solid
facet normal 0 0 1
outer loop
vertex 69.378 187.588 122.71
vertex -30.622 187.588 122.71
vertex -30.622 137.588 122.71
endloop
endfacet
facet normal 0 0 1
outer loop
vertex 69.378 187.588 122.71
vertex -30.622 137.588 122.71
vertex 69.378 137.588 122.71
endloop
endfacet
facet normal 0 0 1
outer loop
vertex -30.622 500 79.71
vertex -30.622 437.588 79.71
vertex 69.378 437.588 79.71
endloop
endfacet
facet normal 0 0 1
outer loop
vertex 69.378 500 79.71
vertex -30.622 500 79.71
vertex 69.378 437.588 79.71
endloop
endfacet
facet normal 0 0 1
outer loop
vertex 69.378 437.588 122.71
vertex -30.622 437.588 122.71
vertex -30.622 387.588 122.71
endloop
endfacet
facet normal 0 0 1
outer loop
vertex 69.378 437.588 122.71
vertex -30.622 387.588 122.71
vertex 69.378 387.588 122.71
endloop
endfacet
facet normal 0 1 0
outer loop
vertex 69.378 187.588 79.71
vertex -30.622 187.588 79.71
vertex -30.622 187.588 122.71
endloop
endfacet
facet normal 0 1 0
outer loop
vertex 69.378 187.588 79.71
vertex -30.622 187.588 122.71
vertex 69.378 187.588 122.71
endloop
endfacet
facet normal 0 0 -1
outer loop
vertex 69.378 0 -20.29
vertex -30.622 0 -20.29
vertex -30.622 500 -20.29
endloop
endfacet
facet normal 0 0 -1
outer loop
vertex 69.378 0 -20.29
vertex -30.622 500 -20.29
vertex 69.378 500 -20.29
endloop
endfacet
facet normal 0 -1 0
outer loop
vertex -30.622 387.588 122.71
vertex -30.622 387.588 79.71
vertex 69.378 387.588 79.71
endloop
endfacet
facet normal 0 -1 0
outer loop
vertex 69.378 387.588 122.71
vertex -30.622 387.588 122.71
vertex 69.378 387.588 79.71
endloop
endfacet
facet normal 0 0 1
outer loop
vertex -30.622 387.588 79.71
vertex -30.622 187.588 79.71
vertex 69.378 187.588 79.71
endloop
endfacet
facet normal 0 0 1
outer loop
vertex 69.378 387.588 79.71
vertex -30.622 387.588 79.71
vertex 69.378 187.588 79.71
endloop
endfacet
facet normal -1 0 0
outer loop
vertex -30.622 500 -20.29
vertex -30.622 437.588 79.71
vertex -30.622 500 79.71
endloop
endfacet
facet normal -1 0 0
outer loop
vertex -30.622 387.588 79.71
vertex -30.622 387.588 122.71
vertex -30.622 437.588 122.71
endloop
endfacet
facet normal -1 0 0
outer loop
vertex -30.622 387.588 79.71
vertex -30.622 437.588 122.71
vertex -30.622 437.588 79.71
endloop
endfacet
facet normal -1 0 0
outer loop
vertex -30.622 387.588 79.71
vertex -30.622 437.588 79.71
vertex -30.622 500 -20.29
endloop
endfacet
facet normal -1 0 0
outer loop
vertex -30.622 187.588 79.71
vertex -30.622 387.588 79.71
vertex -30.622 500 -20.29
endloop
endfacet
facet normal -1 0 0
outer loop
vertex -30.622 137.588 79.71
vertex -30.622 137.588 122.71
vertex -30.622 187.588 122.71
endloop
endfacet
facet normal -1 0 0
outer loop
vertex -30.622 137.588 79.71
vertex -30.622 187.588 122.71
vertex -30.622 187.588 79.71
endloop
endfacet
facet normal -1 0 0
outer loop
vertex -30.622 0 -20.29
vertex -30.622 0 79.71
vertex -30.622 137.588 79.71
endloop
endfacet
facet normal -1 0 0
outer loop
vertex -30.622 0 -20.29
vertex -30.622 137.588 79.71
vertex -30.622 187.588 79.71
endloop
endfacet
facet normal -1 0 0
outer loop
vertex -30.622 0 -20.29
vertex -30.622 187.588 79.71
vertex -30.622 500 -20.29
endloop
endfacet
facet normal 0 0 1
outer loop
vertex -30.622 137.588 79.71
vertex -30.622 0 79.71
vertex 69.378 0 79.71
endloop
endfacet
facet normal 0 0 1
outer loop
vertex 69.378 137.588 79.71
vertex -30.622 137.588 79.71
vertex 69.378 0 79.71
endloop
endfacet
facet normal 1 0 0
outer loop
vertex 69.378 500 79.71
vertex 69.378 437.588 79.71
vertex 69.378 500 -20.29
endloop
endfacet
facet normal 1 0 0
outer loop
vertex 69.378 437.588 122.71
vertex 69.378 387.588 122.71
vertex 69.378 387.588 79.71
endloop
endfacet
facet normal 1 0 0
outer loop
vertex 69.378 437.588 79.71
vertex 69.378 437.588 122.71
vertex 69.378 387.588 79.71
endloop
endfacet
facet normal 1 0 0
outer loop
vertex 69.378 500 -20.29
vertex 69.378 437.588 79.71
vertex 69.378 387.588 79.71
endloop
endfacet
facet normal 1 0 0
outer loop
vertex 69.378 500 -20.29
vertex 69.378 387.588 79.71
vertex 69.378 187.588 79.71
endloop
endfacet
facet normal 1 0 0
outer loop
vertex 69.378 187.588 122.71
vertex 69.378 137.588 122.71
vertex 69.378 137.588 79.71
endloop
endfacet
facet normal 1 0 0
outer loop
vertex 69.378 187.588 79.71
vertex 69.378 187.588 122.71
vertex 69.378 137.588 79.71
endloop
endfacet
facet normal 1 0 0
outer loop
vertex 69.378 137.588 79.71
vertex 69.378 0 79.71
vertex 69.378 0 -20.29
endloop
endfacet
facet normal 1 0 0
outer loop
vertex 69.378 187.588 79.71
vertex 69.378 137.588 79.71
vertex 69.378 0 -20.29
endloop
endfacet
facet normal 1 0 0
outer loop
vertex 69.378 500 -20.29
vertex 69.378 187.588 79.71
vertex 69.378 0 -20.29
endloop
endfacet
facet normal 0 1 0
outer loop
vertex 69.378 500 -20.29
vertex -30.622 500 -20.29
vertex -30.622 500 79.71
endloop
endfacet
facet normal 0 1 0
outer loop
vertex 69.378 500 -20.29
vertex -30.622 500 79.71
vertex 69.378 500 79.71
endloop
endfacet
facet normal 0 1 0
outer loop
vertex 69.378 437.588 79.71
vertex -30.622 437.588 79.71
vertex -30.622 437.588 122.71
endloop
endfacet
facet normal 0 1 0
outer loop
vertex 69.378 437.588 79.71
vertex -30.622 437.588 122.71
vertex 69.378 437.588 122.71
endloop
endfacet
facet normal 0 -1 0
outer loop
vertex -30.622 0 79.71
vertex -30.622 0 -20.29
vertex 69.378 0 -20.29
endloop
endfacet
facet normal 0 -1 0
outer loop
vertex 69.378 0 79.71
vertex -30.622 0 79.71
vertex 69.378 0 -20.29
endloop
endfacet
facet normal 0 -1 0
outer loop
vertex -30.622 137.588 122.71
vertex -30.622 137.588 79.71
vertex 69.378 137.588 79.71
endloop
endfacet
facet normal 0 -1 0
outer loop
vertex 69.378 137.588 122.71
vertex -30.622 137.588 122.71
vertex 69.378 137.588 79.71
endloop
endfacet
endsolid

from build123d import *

# Parameters (mm, degrees)
SKETCH1_W           = 100
SKETCH1_H           = 100
BOSS_EXTRUDE1_DEPTH = 500
SKETCH2_W           = 100
SKETCH2_H           = 50
BOSS_EXTRUDE2_DEPTH = 43


with BuildPart() as part:
    # Sketch1 → Boss-Extrude1 (new body)
    with BuildSketch(Plane(origin=(0, 0, 0), x_dir=(1, 0, 0), z_dir=(0, 1, 0))):
        with Locations((19.377593361, -29.709543568)):
            Rectangle(SKETCH1_W, SKETCH1_H)
    extrude(amount=BOSS_EXTRUDE1_DEPTH)

    # Sketch2 → Boss-Extrude2 (add)
    with BuildSketch(Plane.XY.offset(79.709543568)):
        with Locations((19.377593361, 412.588238816)):
            Rectangle(SKETCH2_W, SKETCH2_H)
        with Locations((19.377593361, 162.588238816)):
            Rectangle(SKETCH2_W, SKETCH2_H)
    extrude(amount=BOSS_EXTRUDE2_DEPTH)


solid = part.part
